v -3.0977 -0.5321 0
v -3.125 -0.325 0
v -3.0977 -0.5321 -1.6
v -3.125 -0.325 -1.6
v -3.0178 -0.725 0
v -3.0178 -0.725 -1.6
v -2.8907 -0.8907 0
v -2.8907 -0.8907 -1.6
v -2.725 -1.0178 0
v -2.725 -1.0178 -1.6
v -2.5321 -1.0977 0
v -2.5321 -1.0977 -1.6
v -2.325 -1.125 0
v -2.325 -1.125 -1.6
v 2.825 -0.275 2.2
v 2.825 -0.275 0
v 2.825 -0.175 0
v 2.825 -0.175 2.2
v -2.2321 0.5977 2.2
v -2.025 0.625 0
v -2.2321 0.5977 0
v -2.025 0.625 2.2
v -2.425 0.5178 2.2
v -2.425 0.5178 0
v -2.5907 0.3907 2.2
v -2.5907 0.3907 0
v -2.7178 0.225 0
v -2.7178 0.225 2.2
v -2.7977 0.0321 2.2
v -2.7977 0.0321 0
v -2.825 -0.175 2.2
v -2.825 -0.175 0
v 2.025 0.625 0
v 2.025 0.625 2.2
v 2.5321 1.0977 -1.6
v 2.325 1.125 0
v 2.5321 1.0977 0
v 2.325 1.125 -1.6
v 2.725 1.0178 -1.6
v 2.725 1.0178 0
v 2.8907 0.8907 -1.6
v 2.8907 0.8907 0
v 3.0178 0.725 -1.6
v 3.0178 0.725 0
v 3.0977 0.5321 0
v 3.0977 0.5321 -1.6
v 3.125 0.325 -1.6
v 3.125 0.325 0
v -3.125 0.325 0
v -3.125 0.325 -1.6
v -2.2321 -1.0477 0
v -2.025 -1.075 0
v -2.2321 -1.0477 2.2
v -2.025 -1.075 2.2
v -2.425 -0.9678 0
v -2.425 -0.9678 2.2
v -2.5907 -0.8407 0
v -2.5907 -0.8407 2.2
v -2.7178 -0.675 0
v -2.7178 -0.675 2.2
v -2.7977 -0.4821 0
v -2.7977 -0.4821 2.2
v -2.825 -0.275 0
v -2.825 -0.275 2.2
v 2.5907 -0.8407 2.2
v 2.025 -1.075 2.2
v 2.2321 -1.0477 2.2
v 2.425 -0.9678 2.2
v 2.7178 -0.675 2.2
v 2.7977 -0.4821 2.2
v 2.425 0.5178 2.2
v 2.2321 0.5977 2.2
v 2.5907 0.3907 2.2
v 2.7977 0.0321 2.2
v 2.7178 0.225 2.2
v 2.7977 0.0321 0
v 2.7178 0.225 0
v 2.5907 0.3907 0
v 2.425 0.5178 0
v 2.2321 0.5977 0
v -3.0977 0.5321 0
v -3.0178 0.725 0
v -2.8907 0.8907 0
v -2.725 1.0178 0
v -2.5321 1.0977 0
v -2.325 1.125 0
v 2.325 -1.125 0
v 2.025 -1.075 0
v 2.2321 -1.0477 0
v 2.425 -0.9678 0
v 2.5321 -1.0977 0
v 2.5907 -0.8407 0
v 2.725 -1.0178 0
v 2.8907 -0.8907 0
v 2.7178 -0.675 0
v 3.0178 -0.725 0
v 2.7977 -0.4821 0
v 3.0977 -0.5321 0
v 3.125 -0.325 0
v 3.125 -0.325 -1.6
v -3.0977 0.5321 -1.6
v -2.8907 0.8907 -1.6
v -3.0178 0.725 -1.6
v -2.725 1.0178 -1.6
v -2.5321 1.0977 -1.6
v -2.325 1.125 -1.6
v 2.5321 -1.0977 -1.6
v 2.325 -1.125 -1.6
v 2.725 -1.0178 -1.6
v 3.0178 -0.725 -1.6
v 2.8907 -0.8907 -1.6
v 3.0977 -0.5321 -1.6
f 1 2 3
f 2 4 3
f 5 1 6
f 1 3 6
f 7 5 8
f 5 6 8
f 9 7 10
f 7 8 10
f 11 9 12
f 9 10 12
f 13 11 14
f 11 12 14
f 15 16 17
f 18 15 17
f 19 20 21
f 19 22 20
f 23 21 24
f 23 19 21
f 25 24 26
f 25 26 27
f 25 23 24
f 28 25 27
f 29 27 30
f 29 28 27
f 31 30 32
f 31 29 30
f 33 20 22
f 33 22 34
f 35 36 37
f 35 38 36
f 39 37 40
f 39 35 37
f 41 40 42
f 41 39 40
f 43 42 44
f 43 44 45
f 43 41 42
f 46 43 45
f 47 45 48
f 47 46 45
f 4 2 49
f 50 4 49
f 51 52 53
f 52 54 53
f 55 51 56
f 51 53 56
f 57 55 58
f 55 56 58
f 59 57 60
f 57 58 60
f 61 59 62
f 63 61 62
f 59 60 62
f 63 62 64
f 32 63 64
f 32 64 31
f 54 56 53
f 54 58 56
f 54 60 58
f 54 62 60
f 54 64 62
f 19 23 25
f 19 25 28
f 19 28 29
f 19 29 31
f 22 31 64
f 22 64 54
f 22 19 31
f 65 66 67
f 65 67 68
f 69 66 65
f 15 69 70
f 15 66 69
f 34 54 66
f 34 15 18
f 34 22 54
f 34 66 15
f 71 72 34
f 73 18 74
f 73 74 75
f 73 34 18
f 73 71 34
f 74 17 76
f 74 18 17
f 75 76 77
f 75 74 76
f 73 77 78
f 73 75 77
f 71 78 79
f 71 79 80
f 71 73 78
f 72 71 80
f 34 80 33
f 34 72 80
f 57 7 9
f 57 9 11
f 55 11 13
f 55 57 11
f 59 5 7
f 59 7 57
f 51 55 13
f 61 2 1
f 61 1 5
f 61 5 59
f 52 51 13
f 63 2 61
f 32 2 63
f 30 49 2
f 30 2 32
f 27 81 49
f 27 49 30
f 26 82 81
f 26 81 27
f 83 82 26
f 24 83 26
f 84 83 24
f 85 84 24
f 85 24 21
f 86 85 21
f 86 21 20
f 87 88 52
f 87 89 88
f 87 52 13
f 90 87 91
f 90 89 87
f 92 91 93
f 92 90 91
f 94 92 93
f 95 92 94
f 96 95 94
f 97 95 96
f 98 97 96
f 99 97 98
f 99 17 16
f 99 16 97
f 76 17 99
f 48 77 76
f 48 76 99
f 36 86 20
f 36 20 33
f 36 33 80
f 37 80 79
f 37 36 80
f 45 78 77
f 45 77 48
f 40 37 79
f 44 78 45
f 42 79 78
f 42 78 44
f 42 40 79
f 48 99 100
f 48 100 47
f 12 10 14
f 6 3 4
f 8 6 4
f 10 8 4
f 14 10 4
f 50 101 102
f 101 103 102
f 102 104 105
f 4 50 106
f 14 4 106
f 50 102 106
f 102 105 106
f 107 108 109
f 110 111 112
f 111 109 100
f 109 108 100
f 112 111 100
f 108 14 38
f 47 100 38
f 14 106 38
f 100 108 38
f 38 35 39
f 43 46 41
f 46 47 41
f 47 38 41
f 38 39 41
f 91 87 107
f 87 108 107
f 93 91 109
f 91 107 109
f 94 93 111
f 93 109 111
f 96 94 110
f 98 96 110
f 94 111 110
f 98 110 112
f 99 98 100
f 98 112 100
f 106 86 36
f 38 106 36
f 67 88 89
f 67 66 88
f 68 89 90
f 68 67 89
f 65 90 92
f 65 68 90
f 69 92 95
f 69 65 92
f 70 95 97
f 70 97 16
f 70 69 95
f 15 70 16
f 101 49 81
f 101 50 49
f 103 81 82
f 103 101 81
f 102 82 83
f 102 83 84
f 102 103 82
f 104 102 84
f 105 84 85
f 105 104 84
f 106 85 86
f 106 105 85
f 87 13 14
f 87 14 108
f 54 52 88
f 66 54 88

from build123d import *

# Parameters (mm, degrees)
F0_W     = 5.65
F0_H     = 1.7
F1_DEPTH = 2.2
F0_W_2   = 6.25
F0_H_2   = 2.25
F2_DEPTH = 1.6
F3_R     = 0.8


with BuildPart() as f1:
    # F0 (on Top) → F1 (new body)
    with BuildSketch(Plane.XY):
        with Locations((0, -0.225)):
            Rectangle(F0_W, F0_H)
    extrude(amount=F1_DEPTH)

    # F0 (on Top) → F2 (join)
    with BuildSketch(Plane.XY):
        Rectangle(F0_W_2, F0_H_2)
        with Locations((0, -0.225)):
            Rectangle(F0_W, F0_H, mode=Mode.SUBTRACT)
        with Locations((0, -0.225)):
            Rectangle(F0_W, F0_H)
    extrude(amount=-F2_DEPTH)

    # F3
    f3_edges = [f1.edges().sort_by_distance(p)[0] for p in [
        (3.125, 1.125, -0.8),
        (-3.125, 1.125, -0.8),
        (2.825, 0.625, 1.1),
        (-2.825, 0.625, 1.1),
        (3.125, -1.125, -0.8),
        (-3.125, -1.125, -0.8),
        (-2.825, -1.075, 1.1),
        (2.825, -1.075, 1.1),
    ]]
    fillet(f3_edges, radius=F3_R)


solid = f1.part
